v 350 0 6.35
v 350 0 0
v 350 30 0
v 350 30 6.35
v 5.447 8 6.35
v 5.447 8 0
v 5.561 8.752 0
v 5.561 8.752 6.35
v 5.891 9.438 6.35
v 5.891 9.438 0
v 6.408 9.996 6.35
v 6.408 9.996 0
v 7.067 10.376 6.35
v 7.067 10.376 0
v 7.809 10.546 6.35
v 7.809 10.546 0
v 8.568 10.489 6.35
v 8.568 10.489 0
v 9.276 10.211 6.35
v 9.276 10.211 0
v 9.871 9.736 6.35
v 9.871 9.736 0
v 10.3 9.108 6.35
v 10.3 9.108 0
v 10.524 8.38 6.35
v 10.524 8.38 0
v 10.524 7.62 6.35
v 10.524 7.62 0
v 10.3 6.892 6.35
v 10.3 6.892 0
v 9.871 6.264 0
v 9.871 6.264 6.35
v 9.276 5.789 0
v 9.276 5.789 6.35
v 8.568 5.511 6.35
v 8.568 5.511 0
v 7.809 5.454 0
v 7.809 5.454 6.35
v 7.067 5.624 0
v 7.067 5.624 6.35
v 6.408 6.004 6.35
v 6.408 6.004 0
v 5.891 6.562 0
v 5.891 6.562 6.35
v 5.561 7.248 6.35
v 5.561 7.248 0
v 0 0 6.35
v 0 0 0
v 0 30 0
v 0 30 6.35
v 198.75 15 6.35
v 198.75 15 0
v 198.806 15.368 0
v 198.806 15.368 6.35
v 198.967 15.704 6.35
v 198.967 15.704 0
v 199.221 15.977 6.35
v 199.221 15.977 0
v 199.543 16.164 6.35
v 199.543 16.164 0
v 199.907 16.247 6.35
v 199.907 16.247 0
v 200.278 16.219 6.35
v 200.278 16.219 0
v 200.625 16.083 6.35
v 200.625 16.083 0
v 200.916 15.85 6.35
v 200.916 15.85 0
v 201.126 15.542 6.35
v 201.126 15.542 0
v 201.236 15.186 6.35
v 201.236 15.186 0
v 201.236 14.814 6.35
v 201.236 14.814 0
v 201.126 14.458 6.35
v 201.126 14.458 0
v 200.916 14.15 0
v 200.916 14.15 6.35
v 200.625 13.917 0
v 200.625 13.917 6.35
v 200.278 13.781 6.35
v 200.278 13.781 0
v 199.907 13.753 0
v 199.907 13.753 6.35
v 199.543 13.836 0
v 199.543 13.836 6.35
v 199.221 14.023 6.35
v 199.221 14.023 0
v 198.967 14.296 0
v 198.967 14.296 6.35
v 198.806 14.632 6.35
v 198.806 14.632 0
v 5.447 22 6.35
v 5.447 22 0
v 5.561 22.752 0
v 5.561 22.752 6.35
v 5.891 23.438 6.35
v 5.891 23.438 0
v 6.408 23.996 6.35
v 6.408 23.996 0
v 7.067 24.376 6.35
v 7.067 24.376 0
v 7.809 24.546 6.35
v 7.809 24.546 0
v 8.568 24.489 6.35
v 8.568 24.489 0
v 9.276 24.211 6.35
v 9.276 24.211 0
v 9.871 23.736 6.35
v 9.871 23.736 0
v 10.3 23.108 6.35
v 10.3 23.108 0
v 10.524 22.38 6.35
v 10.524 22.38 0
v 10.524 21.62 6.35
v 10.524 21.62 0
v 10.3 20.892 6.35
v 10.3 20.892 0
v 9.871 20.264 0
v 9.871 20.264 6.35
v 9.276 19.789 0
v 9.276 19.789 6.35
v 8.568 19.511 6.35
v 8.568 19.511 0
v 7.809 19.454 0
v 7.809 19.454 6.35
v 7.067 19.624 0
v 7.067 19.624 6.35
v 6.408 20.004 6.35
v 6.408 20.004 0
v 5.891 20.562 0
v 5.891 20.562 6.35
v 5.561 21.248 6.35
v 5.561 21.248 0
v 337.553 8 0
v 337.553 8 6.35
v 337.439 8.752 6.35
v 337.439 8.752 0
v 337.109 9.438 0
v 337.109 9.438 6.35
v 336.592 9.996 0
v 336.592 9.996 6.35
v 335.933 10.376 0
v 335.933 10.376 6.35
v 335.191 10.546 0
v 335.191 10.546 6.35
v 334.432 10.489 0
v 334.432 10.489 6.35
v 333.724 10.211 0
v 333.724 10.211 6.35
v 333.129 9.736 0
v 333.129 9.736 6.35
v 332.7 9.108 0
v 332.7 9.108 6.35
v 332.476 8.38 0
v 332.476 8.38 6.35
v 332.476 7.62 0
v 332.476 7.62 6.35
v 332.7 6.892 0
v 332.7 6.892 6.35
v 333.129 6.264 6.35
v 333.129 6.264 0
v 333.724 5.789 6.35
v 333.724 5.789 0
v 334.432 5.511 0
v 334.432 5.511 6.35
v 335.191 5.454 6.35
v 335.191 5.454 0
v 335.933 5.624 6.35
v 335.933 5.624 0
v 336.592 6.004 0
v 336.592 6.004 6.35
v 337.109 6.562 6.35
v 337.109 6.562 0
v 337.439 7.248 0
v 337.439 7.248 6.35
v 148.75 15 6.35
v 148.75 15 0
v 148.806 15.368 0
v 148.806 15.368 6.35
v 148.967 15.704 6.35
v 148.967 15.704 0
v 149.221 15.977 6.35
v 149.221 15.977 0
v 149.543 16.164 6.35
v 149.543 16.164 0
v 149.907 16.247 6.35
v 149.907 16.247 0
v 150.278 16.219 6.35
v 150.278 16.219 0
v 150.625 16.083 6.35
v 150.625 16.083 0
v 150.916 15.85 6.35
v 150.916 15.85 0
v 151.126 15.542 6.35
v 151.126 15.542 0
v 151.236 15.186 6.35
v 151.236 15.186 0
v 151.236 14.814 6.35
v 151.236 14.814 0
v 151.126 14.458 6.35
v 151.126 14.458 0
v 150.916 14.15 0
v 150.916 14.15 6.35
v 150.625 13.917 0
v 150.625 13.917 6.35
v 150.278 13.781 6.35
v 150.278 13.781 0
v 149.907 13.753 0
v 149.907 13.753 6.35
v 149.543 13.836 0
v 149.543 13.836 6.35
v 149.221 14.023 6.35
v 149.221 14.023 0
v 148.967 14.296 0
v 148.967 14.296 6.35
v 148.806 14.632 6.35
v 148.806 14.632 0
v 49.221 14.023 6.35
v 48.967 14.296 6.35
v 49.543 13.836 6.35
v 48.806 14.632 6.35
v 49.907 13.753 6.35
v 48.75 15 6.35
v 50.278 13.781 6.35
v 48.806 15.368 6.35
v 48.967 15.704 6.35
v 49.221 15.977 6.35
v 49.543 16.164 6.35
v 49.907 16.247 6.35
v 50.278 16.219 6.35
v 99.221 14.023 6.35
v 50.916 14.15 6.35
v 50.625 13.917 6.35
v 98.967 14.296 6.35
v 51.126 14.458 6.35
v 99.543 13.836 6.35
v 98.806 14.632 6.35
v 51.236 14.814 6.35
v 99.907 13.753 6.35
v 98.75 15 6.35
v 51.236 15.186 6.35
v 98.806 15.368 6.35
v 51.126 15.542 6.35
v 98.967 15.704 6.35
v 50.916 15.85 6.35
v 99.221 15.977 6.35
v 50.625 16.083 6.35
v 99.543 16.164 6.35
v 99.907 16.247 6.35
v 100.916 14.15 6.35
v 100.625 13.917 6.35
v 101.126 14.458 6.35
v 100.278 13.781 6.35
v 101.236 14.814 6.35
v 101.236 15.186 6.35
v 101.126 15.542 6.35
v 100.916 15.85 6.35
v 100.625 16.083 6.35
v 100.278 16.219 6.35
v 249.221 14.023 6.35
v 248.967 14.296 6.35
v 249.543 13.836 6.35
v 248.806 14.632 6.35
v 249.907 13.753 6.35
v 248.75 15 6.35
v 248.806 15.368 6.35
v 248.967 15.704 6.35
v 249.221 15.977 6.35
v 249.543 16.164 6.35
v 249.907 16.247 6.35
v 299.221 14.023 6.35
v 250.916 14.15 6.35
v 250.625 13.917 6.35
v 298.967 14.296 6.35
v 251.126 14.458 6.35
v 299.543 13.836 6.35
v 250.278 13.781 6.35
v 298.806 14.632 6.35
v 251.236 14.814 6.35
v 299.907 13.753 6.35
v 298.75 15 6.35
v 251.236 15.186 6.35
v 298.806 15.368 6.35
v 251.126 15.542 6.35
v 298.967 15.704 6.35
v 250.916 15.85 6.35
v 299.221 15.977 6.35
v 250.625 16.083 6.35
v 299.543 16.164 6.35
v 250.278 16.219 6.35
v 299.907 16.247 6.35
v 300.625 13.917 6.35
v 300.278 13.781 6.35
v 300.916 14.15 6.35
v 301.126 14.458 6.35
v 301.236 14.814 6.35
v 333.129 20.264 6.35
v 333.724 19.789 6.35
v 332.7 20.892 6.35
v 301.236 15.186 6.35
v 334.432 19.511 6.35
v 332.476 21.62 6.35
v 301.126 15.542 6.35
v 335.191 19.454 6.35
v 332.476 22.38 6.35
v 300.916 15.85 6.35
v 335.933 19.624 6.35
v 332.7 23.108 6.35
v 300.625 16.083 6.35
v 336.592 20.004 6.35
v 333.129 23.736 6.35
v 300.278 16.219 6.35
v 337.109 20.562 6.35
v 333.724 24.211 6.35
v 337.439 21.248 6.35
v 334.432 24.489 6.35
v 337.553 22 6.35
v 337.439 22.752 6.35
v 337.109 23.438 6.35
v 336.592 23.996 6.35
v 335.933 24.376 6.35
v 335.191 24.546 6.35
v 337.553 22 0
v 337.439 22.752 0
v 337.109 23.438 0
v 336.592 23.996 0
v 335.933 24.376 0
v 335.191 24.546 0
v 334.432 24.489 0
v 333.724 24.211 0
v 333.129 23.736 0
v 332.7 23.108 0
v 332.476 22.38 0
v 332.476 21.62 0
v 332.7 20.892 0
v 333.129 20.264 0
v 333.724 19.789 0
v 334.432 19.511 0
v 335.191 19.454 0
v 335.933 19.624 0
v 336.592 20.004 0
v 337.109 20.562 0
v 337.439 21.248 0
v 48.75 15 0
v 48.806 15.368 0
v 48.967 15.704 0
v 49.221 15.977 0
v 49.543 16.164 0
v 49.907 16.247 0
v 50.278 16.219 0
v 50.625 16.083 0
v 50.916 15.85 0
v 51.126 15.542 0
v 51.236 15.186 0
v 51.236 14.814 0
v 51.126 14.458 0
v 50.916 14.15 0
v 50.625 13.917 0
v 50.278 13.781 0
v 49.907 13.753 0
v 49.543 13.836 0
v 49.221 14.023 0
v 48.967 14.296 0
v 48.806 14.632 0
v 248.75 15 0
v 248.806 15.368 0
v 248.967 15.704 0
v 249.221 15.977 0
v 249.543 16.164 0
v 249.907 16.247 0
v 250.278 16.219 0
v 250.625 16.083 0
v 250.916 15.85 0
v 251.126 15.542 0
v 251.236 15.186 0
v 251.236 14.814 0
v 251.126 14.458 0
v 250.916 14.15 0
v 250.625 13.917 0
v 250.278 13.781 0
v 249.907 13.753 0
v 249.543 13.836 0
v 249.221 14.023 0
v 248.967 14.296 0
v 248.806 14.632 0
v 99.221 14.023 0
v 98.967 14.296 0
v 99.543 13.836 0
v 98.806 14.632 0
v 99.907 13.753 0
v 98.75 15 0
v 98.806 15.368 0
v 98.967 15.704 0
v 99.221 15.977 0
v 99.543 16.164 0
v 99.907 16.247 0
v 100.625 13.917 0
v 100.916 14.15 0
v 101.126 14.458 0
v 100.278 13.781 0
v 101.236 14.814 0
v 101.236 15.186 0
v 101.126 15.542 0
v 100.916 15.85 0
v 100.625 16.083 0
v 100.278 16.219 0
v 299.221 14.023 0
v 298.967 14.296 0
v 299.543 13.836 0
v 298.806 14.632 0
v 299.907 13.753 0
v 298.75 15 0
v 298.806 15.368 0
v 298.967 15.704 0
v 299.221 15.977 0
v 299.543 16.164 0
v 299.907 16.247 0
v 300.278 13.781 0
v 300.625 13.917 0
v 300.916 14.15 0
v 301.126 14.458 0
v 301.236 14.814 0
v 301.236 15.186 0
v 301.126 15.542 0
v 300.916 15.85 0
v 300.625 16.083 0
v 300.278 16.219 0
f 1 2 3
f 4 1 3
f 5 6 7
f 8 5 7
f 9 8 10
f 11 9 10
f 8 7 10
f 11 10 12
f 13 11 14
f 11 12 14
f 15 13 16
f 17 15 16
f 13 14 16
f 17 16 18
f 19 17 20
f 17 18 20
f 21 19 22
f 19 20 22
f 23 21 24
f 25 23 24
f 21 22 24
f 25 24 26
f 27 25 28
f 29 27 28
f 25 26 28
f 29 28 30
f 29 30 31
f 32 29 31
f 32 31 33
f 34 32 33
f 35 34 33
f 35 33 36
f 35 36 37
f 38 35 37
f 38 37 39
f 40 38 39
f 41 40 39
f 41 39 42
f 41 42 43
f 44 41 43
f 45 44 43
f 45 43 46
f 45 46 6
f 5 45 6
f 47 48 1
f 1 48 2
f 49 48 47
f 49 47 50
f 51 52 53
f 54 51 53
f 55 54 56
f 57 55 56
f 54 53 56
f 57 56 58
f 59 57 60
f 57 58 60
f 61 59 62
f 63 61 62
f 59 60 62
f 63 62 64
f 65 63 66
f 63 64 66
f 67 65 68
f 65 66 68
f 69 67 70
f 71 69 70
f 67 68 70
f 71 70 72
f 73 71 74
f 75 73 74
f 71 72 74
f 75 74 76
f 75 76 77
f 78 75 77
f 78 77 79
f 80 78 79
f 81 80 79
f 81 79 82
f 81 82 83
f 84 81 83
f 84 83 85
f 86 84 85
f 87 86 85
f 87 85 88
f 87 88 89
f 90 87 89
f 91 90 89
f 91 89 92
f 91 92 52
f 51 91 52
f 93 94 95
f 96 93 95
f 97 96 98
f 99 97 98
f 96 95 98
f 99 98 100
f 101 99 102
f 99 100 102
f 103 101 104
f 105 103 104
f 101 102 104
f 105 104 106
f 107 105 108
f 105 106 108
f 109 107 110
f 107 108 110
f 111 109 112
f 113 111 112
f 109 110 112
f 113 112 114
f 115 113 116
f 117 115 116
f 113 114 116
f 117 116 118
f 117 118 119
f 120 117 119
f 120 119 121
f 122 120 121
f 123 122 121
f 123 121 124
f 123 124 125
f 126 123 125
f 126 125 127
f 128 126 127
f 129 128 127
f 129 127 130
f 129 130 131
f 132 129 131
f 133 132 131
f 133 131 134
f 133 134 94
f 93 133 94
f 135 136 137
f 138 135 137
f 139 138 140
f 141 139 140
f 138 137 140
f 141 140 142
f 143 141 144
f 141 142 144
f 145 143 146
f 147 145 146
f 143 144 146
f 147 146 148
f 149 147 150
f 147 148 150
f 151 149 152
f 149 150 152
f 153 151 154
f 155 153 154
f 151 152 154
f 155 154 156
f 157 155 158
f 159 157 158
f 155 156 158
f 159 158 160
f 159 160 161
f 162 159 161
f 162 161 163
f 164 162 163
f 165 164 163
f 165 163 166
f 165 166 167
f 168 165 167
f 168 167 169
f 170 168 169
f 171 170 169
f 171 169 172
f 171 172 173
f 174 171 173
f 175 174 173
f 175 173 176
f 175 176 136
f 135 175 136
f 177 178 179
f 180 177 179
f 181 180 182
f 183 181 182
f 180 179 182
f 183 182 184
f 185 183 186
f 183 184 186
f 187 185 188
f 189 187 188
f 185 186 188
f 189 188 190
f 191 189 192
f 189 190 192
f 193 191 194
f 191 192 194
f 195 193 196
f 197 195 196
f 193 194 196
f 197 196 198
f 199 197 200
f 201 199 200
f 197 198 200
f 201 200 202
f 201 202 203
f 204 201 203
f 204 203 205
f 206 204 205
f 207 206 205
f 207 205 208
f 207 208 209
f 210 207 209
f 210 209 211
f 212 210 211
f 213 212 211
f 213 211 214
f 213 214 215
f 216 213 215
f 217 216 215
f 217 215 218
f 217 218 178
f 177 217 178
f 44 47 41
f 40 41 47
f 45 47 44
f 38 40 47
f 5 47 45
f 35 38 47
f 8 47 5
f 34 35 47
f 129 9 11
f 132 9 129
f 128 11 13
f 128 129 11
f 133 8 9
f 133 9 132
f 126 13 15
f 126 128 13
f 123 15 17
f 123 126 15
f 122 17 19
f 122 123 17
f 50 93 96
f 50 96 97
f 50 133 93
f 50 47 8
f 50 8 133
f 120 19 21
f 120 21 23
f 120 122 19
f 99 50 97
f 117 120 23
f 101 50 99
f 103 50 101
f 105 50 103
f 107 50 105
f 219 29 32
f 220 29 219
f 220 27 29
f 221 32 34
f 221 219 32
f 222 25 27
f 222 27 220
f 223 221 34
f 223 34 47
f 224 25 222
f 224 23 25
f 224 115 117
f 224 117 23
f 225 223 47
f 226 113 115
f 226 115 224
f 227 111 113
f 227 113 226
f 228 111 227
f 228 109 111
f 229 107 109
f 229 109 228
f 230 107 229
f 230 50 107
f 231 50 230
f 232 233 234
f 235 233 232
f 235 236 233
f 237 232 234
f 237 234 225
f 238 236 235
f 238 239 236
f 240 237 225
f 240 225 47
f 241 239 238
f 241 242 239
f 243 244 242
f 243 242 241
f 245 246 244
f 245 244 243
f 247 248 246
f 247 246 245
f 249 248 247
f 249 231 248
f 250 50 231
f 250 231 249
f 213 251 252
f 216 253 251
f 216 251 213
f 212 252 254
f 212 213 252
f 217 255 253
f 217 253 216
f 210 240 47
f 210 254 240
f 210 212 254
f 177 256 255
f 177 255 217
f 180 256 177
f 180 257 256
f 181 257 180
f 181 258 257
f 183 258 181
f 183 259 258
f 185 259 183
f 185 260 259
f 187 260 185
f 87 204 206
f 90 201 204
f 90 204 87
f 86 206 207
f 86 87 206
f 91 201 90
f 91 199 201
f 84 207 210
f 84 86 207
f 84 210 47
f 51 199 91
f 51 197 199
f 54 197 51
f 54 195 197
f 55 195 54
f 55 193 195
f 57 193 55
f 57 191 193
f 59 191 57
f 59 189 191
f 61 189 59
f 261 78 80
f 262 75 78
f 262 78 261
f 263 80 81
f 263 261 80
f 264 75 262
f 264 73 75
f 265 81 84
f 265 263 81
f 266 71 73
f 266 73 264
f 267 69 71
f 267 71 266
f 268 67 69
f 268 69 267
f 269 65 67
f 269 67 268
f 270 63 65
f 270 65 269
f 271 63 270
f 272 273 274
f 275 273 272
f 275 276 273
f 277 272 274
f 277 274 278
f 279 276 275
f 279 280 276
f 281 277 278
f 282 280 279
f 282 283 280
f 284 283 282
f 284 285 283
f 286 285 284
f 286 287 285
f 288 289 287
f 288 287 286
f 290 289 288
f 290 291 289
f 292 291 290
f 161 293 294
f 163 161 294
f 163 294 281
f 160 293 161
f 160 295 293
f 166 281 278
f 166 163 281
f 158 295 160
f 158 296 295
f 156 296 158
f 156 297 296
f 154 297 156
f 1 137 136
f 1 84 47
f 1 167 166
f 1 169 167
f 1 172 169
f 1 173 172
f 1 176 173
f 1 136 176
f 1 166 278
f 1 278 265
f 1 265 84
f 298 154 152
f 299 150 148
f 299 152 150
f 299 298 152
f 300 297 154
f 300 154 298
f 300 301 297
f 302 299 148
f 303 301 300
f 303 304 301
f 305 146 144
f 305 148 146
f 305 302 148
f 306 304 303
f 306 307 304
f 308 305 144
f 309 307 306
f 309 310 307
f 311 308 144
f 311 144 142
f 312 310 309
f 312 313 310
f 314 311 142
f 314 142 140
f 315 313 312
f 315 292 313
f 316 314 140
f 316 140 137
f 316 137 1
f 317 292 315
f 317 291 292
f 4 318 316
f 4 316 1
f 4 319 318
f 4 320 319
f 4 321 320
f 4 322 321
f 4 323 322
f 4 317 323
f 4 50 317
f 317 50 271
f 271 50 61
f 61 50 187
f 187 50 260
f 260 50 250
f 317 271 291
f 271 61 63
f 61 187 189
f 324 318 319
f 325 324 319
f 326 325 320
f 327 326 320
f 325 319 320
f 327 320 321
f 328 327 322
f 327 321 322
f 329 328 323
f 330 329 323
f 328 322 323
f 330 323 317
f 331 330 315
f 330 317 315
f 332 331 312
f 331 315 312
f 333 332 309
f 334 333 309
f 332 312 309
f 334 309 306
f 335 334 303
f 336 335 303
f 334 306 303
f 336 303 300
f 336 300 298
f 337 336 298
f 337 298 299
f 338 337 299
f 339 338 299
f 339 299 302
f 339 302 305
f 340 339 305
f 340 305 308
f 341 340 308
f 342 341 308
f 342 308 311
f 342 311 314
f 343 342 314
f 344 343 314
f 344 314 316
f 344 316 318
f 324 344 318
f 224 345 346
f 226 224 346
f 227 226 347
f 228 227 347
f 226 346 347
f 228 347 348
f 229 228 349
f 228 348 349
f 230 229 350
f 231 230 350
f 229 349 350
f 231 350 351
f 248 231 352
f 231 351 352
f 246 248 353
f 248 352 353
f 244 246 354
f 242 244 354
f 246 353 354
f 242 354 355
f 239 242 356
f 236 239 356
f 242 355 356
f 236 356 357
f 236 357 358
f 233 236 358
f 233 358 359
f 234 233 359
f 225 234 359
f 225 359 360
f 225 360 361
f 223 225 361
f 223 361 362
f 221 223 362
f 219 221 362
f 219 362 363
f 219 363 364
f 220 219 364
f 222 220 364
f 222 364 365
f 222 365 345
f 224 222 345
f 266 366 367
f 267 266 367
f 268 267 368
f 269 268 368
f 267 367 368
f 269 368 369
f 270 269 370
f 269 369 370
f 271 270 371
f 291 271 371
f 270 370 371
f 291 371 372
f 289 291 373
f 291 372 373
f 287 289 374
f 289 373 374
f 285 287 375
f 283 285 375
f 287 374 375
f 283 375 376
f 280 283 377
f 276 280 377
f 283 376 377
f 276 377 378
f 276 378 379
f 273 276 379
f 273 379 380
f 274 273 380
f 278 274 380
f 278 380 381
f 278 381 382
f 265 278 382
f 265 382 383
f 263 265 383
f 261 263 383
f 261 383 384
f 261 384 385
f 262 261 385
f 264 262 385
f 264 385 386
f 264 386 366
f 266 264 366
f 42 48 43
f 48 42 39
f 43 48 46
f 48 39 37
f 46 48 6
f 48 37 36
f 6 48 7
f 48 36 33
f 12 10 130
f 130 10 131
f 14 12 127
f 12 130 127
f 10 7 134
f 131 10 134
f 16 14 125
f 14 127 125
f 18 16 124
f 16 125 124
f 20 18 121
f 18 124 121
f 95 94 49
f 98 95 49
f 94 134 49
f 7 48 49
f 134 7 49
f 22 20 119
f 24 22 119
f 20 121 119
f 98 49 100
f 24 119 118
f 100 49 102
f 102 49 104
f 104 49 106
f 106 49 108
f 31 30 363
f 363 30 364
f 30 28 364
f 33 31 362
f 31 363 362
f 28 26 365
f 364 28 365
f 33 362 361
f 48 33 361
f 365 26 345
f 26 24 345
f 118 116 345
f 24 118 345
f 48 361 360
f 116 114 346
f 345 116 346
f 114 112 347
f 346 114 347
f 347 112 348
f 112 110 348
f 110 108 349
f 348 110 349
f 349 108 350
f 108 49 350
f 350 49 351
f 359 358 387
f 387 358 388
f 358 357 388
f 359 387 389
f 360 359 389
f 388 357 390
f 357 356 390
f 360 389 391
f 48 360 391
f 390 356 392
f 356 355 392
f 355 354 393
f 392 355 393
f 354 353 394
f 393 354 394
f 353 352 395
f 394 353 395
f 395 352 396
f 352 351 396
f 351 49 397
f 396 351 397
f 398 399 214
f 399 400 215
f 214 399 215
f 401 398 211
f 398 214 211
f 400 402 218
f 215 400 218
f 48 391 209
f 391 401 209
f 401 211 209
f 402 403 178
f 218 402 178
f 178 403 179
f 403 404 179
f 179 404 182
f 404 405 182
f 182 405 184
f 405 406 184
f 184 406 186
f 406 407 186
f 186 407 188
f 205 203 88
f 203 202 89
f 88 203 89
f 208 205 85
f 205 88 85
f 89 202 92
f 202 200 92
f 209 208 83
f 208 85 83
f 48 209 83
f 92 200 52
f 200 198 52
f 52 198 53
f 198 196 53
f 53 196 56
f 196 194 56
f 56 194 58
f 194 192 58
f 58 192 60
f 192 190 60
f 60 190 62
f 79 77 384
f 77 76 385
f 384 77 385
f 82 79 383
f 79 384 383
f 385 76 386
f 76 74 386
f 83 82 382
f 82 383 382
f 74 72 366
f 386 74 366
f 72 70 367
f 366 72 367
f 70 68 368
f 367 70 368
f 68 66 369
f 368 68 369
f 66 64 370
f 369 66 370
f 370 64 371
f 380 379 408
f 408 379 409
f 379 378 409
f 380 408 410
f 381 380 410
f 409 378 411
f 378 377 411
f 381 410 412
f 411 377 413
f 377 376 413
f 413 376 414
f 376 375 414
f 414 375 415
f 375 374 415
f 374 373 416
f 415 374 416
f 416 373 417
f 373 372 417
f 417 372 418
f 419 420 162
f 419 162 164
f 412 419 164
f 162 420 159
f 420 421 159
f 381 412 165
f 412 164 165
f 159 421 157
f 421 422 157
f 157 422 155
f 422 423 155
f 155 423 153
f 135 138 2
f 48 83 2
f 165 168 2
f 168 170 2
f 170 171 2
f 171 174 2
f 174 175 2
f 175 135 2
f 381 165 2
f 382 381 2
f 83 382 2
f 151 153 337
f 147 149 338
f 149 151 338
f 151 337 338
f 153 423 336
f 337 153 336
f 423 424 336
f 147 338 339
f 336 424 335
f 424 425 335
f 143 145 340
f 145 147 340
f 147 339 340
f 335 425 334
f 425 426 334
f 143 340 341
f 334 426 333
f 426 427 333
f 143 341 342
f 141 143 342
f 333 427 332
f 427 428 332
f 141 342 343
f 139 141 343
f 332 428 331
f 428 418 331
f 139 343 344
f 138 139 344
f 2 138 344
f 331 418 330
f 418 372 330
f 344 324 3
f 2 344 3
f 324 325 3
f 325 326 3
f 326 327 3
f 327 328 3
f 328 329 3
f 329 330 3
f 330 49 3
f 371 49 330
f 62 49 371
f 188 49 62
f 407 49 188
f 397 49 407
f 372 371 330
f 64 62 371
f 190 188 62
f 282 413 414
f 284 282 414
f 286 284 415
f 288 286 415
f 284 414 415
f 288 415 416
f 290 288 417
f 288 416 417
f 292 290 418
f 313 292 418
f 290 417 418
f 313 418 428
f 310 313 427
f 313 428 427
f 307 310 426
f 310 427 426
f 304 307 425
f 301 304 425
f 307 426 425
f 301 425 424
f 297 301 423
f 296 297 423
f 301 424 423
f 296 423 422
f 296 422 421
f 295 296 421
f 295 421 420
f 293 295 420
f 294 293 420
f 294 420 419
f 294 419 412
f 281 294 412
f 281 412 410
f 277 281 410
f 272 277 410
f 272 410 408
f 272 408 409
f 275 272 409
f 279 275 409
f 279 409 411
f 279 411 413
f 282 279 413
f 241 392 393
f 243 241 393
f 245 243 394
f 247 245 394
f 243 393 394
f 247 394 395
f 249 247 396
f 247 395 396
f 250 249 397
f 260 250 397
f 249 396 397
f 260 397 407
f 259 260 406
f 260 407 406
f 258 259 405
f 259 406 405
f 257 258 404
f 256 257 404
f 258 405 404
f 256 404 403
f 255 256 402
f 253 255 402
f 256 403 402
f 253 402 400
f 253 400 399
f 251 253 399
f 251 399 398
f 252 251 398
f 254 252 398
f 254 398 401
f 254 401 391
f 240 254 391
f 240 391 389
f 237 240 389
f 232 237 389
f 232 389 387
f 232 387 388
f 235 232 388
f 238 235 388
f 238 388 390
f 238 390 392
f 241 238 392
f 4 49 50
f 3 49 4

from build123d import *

# Parameters (mm, degrees)
SKETCH2_W                   = 350
SKETCH2_H                   = 30
BOSS_EXTRUDE1_DEPTH         = 6.35
TAP_DRILL_FOR_1_4_20_TAP2_D = 5.1054
TAP_DRILL_FOR_M3X0_5_TAP1_D = 2.5
LPATTERN1_COUNT             = 6
LPATTERN1_PITCH             = 50
TAP_DRILL_FOR_1_4_20_TAP1_D = 5.1054


with BuildPart() as part:
    # Sketch2 → Boss-Extrude1 (new body)
    with BuildSketch(Plane.XY):
        with Locations((175, 15)):
            Rectangle(SKETCH2_W, SKETCH2_H)
    extrude(amount=BOSS_EXTRUDE1_DEPTH)

    # Tap Drill for 1/4-20 Tap2 (through all)
    with Locations(Plane.XY.offset(6.35)):
        with Locations((8, 22), (8, 8)):
            Hole(TAP_DRILL_FOR_1_4_20_TAP2_D / 2)

    # Tap Drill for M3x0.5 Tap1 (through all)
    with Locations(Plane.XY.offset(6.35)):
        with Locations((50, 15)):
            tap_drill_for_m3x0_5_tap1 = Hole(TAP_DRILL_FOR_M3X0_5_TAP1_D / 2)

    # LPattern1: Tap Drill for M3x0.5 Tap1 ×6
    with Locations(*[(i * LPATTERN1_PITCH, 0, 0) for i in range(1, LPATTERN1_COUNT)]):
        add(tap_drill_for_m3x0_5_tap1, mode=Mode.SUBTRACT)

    # Tap Drill for 1/4-20 Tap1 (through all)
    with Locations(Plane(origin=(0, 0, 0), x_dir=(-1, 0, 0), z_dir=(0, 0, -1))):
        with Locations((-335, 22), (-335, 8)):
            Hole(TAP_DRILL_FOR_1_4_20_TAP1_D / 2)


solid = part.part
